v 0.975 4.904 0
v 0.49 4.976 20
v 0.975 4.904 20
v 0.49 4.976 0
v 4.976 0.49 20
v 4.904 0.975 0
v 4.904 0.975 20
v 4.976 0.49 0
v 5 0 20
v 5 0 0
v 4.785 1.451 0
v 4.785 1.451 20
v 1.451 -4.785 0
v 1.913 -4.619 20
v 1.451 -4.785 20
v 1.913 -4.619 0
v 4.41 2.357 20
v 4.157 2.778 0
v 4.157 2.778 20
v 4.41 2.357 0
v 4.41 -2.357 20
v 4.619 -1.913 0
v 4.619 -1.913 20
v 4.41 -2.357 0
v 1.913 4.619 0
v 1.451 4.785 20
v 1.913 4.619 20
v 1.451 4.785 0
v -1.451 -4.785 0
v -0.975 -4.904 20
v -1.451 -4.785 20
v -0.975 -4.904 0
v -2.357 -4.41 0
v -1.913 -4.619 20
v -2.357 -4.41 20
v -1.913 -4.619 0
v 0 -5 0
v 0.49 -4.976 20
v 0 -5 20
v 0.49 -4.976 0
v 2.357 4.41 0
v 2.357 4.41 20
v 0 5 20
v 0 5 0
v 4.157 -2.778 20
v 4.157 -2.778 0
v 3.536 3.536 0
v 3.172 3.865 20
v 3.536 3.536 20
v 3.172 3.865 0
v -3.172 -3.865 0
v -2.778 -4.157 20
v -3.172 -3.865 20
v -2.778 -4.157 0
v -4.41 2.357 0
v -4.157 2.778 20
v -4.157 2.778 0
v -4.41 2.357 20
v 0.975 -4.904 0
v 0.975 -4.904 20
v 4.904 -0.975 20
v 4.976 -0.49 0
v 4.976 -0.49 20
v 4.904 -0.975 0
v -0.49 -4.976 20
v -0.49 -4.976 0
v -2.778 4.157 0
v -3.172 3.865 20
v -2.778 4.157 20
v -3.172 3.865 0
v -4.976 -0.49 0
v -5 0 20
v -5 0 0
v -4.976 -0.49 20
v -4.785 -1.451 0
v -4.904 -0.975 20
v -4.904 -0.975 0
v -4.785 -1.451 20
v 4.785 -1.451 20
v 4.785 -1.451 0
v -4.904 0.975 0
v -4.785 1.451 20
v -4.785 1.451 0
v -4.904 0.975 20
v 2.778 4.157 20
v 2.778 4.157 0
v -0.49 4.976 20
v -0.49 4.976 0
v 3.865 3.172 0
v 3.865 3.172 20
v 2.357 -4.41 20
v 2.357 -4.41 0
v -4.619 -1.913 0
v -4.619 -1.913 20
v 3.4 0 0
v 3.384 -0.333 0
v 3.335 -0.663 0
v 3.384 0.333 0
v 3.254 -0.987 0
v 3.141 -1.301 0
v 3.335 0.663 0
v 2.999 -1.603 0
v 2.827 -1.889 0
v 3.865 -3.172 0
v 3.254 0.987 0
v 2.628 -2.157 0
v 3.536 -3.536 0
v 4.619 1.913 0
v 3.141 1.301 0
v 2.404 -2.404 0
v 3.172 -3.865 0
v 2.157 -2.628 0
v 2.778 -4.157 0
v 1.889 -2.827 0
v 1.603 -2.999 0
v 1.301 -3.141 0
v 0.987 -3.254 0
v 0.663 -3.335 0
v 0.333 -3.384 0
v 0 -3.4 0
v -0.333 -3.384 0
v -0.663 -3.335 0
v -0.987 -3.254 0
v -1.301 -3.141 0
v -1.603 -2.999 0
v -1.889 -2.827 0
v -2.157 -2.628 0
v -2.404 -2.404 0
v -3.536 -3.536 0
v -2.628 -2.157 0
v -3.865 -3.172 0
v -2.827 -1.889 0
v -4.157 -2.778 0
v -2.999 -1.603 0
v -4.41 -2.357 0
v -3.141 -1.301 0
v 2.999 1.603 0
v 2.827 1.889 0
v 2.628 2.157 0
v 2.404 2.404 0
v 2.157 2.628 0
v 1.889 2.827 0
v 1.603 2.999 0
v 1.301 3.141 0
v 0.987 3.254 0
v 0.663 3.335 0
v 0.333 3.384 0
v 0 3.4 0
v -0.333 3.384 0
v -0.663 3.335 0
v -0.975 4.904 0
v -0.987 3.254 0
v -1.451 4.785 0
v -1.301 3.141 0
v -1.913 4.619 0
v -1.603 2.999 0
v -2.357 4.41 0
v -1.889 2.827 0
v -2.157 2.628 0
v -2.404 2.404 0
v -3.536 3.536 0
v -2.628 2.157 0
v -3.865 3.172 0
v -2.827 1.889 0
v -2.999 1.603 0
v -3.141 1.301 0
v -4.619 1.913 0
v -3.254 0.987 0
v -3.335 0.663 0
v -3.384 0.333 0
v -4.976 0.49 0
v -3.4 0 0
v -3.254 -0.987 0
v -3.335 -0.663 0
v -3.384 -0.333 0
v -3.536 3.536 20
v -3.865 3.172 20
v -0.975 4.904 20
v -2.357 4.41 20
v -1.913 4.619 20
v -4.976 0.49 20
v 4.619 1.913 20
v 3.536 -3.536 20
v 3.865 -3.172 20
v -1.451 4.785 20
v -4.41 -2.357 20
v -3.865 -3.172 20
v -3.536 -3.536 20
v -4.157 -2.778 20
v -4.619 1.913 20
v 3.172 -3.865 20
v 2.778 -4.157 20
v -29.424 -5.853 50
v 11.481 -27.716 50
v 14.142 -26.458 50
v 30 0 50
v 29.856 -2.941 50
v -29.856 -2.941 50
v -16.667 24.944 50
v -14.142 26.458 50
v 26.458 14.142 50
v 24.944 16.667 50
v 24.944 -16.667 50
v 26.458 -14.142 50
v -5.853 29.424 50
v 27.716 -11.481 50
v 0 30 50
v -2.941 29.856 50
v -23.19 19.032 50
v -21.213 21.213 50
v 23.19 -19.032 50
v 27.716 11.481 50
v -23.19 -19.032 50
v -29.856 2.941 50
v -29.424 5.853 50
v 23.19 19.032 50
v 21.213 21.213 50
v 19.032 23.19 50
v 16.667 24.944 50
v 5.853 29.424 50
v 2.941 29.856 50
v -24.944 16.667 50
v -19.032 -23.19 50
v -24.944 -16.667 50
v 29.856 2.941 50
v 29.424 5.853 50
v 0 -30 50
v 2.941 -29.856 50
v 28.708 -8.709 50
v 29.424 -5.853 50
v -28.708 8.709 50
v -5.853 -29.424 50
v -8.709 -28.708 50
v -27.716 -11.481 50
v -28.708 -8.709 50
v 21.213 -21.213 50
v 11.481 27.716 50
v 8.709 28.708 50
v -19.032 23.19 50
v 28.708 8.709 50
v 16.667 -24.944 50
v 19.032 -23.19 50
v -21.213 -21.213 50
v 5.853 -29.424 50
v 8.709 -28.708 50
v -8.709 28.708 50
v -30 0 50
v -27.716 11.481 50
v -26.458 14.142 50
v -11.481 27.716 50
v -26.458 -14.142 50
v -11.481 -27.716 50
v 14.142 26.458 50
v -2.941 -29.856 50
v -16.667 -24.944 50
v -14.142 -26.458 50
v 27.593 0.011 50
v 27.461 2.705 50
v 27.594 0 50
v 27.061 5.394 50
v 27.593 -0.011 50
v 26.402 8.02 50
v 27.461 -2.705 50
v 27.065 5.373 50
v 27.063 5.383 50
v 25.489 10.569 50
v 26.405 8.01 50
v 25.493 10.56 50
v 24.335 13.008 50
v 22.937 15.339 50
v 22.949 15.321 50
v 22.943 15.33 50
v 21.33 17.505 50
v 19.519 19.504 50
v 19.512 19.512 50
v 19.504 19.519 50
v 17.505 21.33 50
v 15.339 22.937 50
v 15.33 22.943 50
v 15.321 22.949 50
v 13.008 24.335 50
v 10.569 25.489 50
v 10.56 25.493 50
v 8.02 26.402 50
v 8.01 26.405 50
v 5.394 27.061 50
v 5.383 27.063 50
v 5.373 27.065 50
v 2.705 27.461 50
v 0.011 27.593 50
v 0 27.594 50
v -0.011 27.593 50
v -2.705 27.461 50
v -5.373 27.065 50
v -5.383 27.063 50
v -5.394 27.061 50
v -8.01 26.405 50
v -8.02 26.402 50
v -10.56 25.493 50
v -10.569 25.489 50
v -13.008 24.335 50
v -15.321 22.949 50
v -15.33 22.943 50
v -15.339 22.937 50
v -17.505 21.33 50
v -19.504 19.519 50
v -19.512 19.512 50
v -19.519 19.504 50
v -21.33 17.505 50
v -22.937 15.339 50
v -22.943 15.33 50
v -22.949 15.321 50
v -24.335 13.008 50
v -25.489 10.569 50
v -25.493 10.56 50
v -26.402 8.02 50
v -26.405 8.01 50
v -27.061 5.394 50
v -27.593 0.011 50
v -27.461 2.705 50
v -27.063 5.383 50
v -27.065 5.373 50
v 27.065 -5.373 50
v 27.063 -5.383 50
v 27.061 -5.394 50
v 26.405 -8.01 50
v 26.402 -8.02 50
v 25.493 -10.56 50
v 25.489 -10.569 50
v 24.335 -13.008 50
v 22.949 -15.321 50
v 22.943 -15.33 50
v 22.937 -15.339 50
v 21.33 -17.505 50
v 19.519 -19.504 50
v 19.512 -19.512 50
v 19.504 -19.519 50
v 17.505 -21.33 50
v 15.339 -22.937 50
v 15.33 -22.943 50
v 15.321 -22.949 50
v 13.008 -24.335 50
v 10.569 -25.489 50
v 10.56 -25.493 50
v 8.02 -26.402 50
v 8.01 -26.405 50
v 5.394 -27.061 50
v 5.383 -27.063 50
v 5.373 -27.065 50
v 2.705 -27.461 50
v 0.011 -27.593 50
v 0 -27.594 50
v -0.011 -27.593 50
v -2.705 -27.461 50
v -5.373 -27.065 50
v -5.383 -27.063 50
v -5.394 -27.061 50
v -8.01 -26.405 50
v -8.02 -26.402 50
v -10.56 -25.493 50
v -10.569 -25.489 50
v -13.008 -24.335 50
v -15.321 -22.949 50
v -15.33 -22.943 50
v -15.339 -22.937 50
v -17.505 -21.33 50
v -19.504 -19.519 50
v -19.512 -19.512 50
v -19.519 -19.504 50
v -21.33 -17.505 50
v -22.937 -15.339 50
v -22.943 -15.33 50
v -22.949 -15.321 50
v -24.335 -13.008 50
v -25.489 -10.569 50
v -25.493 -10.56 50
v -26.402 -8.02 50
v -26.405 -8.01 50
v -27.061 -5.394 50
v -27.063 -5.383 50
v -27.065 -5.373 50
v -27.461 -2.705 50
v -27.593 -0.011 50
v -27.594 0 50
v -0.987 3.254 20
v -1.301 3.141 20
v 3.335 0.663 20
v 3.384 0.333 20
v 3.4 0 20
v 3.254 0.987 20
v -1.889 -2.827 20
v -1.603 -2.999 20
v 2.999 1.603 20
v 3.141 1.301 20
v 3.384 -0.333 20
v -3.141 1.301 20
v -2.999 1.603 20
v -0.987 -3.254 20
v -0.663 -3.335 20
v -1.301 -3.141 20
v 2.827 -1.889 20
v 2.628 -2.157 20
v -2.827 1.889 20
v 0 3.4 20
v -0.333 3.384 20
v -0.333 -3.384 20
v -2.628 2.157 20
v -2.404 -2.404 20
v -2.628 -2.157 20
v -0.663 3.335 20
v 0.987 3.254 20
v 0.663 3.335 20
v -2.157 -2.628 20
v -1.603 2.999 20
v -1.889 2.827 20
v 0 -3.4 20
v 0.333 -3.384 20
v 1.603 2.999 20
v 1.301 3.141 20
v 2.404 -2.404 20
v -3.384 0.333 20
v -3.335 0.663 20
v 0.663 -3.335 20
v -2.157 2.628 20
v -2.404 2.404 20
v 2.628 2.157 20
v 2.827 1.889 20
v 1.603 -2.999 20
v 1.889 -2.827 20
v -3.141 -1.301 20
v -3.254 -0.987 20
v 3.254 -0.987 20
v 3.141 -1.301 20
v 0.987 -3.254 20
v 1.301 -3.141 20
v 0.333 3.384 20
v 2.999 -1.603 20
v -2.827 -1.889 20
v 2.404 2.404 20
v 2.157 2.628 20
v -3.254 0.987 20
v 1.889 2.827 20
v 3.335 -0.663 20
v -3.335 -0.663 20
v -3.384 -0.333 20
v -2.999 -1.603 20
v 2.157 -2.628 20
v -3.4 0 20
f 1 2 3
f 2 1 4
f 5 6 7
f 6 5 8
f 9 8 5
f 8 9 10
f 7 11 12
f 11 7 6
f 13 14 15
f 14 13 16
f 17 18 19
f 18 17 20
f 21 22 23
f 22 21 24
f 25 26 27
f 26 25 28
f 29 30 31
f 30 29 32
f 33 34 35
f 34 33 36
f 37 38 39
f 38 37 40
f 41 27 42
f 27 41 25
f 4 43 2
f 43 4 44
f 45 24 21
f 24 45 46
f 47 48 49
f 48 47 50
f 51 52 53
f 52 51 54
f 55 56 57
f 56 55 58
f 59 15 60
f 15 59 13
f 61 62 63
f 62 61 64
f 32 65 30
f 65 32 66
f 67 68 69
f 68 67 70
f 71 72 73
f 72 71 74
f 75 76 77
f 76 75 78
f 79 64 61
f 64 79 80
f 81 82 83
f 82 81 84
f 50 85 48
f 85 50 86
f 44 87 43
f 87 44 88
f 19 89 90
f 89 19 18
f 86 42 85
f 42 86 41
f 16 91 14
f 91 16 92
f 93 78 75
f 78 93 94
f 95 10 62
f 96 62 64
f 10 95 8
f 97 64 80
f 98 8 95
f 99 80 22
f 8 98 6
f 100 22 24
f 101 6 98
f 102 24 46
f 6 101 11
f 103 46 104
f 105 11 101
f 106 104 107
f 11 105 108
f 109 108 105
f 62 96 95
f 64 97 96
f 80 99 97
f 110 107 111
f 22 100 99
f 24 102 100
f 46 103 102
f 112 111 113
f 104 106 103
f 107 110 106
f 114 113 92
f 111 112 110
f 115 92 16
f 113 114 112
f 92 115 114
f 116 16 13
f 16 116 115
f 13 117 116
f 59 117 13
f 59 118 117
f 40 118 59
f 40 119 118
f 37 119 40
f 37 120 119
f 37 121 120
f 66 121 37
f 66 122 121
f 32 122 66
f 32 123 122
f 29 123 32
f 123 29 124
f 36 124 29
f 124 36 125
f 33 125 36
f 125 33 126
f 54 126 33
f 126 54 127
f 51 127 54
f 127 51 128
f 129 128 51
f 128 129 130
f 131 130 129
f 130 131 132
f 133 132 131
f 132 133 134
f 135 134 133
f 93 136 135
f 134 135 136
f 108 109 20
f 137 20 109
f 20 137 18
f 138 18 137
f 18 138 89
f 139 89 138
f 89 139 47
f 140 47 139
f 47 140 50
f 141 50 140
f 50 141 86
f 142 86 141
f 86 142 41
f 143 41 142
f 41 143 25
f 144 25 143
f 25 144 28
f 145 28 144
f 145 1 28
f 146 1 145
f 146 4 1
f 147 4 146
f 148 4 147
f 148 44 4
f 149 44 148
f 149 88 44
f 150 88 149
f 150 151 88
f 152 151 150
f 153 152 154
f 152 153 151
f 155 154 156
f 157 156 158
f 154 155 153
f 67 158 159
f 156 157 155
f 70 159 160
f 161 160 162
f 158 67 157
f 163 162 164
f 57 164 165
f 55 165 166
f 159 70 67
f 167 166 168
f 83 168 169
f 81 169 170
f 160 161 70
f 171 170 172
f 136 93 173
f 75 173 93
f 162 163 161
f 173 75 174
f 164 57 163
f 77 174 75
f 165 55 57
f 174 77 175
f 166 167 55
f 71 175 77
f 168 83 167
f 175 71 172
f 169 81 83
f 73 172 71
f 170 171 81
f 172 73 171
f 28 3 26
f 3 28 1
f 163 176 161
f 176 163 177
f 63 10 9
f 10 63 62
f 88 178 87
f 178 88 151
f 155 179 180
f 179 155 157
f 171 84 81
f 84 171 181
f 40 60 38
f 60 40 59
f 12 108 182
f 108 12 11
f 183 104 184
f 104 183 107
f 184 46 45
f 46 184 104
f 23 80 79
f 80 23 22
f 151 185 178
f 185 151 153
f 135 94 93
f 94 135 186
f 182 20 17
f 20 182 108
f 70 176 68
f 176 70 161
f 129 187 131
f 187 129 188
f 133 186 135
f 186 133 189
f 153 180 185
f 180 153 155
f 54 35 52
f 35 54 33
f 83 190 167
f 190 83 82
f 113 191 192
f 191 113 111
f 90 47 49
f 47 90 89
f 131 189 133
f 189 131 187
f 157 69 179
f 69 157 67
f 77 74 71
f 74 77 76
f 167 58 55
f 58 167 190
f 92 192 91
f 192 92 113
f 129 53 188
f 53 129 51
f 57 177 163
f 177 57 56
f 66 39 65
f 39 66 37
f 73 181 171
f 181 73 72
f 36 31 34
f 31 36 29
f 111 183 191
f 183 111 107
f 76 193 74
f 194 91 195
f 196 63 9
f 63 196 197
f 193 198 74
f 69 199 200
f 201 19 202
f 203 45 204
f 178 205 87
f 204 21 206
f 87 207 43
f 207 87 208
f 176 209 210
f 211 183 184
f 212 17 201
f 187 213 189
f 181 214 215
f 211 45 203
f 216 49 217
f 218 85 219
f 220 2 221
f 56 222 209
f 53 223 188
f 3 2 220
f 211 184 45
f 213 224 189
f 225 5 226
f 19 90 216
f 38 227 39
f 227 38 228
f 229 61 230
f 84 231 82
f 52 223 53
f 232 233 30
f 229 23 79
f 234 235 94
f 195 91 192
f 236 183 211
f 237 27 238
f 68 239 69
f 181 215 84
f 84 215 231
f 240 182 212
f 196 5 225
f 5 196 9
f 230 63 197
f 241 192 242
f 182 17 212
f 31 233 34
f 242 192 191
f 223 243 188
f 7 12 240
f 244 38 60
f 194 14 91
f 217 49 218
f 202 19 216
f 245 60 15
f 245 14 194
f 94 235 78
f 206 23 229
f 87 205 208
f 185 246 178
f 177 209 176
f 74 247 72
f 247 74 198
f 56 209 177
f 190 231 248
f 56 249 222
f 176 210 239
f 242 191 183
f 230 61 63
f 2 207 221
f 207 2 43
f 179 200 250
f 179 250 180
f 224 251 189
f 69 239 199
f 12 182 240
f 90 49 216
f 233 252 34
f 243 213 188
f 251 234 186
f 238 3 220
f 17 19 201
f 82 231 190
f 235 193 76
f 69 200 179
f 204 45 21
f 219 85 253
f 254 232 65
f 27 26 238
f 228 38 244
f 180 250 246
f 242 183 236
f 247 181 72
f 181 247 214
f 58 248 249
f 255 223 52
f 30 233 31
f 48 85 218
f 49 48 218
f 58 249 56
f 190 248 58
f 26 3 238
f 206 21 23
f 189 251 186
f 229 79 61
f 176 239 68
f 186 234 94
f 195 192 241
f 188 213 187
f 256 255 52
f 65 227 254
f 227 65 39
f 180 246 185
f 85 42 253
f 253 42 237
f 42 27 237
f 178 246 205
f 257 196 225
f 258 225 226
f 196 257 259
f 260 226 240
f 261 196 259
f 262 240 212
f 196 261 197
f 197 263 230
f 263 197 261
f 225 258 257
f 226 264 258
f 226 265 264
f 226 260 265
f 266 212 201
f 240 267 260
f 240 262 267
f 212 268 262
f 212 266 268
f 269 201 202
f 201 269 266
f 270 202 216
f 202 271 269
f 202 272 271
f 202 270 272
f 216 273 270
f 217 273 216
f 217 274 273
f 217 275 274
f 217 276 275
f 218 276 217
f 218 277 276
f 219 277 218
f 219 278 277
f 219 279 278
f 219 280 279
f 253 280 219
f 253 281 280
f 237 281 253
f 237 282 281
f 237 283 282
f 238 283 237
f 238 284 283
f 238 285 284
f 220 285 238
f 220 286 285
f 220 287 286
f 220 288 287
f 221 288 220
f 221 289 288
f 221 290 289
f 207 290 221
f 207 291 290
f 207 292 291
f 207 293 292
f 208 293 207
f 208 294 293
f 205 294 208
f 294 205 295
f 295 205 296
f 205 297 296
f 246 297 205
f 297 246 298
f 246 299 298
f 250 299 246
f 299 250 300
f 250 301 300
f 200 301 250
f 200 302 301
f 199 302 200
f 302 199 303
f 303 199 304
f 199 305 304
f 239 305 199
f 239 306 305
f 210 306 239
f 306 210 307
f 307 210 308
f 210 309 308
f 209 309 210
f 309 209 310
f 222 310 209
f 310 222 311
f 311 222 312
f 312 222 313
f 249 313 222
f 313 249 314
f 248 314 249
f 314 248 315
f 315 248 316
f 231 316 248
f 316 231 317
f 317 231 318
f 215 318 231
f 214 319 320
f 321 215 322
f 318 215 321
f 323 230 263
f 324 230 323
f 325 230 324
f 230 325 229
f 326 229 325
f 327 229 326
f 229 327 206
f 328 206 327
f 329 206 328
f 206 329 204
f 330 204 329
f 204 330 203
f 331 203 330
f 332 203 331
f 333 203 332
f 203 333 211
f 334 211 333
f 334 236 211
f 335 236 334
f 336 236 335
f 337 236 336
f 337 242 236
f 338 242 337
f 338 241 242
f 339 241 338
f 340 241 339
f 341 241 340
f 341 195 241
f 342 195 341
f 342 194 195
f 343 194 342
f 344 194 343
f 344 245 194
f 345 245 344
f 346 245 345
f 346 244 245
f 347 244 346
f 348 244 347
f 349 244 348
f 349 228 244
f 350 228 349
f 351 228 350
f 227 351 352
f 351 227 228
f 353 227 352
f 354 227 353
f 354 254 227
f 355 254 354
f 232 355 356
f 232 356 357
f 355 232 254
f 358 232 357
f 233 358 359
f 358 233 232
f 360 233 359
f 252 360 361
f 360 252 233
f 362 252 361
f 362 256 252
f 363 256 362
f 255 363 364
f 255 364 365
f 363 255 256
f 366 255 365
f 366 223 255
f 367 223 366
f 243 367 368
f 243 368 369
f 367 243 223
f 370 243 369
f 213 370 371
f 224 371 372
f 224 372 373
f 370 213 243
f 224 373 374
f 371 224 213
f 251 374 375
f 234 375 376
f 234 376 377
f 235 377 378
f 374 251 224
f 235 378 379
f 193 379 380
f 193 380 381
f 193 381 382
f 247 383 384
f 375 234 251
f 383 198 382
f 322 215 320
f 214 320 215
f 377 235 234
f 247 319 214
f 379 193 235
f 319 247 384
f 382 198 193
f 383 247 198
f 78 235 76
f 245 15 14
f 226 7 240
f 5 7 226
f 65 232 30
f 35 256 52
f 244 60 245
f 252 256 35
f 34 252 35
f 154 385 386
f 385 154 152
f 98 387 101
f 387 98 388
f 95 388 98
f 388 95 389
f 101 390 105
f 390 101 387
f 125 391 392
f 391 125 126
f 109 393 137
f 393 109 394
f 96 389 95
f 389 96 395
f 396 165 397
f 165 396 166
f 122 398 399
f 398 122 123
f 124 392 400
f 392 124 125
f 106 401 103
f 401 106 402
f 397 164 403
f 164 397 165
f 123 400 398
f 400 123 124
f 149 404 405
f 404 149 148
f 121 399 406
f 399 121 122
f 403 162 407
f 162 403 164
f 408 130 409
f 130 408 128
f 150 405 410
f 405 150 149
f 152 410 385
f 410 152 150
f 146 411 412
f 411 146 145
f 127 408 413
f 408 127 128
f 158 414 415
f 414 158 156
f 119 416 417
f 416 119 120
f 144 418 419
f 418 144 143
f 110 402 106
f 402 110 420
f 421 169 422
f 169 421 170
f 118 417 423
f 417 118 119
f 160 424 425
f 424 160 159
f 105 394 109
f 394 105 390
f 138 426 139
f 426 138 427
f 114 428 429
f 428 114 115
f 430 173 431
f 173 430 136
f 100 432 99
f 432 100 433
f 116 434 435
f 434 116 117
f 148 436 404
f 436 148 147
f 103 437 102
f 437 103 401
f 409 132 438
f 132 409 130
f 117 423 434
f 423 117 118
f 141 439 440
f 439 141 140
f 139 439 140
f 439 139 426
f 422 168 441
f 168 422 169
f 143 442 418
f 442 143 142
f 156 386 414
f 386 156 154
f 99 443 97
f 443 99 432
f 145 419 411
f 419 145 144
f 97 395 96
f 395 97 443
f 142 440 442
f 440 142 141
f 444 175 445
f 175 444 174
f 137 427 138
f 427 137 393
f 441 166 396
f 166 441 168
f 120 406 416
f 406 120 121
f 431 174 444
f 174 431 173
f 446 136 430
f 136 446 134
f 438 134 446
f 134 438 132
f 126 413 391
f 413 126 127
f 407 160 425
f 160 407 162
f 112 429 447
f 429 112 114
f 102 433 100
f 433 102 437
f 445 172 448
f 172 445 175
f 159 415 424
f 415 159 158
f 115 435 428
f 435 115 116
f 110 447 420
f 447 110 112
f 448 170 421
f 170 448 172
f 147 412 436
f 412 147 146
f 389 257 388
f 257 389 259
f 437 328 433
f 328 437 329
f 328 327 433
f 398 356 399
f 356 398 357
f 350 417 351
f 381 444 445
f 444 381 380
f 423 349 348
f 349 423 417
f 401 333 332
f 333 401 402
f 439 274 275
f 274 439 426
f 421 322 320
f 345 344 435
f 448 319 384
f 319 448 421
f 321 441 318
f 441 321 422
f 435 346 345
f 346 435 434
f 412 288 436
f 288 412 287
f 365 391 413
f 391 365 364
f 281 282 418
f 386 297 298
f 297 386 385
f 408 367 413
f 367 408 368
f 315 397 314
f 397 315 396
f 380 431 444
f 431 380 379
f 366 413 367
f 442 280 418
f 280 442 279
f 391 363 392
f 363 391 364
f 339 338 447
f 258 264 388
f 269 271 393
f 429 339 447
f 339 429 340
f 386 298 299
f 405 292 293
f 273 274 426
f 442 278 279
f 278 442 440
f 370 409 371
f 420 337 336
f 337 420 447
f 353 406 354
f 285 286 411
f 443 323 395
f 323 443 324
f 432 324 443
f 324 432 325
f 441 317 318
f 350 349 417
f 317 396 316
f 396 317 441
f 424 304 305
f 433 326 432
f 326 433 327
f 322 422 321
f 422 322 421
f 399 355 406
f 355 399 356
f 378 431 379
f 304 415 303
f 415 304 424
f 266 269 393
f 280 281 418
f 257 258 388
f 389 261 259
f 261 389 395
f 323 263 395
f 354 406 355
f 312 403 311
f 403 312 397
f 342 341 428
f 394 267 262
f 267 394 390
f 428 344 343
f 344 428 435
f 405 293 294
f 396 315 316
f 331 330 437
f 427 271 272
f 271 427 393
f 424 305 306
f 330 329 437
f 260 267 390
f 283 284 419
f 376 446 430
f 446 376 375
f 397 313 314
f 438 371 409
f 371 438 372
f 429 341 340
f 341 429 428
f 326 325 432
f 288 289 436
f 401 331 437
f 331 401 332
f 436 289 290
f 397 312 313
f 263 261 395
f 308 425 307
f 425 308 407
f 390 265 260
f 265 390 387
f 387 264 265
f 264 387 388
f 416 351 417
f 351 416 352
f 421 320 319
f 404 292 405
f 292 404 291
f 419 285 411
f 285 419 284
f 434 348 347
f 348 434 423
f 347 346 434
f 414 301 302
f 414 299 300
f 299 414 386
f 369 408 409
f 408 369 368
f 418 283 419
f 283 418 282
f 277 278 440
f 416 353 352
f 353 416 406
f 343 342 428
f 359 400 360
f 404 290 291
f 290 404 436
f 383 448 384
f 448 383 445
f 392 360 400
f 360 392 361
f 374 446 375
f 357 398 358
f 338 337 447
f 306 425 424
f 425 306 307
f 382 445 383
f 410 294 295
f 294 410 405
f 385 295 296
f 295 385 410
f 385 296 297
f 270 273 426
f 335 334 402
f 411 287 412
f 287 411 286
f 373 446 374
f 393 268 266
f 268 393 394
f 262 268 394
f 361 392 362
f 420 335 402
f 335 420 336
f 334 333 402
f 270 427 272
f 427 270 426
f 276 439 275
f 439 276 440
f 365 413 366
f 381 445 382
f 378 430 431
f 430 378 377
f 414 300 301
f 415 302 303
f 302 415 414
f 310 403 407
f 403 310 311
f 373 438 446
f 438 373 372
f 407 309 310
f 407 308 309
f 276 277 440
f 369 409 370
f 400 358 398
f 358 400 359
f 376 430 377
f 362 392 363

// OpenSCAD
// Funnel - a straight spout (tube) with a conical bowl, open at both ends, for pouring
// liquids in the lab. NOVEL general part.
//

spout_d = 10;
spout_l = 20;
cone_d  = 60;
rim     = 50;
wall    = 1.6;

$fn = 64;

ib = spout_d - 2 * wall;   // bore of the spout

difference() {
    union() {
        cylinder(h = spout_l, d = spout_d);          // spout
        translate([0, 0, spout_l]) cylinder(h = rim - spout_l, d1 = spout_d, d2 = cone_d);  // bowl
    }
    translate([0, 0, -1]) cylinder(h = spout_l + 2, d = ib);   // bore through the spout
    translate([0, 0, spout_l]) cylinder(h = rim - spout_l + 1, d1 = ib, d2 = cone_d - 2 * wall);  // open the bowl inner space
}
